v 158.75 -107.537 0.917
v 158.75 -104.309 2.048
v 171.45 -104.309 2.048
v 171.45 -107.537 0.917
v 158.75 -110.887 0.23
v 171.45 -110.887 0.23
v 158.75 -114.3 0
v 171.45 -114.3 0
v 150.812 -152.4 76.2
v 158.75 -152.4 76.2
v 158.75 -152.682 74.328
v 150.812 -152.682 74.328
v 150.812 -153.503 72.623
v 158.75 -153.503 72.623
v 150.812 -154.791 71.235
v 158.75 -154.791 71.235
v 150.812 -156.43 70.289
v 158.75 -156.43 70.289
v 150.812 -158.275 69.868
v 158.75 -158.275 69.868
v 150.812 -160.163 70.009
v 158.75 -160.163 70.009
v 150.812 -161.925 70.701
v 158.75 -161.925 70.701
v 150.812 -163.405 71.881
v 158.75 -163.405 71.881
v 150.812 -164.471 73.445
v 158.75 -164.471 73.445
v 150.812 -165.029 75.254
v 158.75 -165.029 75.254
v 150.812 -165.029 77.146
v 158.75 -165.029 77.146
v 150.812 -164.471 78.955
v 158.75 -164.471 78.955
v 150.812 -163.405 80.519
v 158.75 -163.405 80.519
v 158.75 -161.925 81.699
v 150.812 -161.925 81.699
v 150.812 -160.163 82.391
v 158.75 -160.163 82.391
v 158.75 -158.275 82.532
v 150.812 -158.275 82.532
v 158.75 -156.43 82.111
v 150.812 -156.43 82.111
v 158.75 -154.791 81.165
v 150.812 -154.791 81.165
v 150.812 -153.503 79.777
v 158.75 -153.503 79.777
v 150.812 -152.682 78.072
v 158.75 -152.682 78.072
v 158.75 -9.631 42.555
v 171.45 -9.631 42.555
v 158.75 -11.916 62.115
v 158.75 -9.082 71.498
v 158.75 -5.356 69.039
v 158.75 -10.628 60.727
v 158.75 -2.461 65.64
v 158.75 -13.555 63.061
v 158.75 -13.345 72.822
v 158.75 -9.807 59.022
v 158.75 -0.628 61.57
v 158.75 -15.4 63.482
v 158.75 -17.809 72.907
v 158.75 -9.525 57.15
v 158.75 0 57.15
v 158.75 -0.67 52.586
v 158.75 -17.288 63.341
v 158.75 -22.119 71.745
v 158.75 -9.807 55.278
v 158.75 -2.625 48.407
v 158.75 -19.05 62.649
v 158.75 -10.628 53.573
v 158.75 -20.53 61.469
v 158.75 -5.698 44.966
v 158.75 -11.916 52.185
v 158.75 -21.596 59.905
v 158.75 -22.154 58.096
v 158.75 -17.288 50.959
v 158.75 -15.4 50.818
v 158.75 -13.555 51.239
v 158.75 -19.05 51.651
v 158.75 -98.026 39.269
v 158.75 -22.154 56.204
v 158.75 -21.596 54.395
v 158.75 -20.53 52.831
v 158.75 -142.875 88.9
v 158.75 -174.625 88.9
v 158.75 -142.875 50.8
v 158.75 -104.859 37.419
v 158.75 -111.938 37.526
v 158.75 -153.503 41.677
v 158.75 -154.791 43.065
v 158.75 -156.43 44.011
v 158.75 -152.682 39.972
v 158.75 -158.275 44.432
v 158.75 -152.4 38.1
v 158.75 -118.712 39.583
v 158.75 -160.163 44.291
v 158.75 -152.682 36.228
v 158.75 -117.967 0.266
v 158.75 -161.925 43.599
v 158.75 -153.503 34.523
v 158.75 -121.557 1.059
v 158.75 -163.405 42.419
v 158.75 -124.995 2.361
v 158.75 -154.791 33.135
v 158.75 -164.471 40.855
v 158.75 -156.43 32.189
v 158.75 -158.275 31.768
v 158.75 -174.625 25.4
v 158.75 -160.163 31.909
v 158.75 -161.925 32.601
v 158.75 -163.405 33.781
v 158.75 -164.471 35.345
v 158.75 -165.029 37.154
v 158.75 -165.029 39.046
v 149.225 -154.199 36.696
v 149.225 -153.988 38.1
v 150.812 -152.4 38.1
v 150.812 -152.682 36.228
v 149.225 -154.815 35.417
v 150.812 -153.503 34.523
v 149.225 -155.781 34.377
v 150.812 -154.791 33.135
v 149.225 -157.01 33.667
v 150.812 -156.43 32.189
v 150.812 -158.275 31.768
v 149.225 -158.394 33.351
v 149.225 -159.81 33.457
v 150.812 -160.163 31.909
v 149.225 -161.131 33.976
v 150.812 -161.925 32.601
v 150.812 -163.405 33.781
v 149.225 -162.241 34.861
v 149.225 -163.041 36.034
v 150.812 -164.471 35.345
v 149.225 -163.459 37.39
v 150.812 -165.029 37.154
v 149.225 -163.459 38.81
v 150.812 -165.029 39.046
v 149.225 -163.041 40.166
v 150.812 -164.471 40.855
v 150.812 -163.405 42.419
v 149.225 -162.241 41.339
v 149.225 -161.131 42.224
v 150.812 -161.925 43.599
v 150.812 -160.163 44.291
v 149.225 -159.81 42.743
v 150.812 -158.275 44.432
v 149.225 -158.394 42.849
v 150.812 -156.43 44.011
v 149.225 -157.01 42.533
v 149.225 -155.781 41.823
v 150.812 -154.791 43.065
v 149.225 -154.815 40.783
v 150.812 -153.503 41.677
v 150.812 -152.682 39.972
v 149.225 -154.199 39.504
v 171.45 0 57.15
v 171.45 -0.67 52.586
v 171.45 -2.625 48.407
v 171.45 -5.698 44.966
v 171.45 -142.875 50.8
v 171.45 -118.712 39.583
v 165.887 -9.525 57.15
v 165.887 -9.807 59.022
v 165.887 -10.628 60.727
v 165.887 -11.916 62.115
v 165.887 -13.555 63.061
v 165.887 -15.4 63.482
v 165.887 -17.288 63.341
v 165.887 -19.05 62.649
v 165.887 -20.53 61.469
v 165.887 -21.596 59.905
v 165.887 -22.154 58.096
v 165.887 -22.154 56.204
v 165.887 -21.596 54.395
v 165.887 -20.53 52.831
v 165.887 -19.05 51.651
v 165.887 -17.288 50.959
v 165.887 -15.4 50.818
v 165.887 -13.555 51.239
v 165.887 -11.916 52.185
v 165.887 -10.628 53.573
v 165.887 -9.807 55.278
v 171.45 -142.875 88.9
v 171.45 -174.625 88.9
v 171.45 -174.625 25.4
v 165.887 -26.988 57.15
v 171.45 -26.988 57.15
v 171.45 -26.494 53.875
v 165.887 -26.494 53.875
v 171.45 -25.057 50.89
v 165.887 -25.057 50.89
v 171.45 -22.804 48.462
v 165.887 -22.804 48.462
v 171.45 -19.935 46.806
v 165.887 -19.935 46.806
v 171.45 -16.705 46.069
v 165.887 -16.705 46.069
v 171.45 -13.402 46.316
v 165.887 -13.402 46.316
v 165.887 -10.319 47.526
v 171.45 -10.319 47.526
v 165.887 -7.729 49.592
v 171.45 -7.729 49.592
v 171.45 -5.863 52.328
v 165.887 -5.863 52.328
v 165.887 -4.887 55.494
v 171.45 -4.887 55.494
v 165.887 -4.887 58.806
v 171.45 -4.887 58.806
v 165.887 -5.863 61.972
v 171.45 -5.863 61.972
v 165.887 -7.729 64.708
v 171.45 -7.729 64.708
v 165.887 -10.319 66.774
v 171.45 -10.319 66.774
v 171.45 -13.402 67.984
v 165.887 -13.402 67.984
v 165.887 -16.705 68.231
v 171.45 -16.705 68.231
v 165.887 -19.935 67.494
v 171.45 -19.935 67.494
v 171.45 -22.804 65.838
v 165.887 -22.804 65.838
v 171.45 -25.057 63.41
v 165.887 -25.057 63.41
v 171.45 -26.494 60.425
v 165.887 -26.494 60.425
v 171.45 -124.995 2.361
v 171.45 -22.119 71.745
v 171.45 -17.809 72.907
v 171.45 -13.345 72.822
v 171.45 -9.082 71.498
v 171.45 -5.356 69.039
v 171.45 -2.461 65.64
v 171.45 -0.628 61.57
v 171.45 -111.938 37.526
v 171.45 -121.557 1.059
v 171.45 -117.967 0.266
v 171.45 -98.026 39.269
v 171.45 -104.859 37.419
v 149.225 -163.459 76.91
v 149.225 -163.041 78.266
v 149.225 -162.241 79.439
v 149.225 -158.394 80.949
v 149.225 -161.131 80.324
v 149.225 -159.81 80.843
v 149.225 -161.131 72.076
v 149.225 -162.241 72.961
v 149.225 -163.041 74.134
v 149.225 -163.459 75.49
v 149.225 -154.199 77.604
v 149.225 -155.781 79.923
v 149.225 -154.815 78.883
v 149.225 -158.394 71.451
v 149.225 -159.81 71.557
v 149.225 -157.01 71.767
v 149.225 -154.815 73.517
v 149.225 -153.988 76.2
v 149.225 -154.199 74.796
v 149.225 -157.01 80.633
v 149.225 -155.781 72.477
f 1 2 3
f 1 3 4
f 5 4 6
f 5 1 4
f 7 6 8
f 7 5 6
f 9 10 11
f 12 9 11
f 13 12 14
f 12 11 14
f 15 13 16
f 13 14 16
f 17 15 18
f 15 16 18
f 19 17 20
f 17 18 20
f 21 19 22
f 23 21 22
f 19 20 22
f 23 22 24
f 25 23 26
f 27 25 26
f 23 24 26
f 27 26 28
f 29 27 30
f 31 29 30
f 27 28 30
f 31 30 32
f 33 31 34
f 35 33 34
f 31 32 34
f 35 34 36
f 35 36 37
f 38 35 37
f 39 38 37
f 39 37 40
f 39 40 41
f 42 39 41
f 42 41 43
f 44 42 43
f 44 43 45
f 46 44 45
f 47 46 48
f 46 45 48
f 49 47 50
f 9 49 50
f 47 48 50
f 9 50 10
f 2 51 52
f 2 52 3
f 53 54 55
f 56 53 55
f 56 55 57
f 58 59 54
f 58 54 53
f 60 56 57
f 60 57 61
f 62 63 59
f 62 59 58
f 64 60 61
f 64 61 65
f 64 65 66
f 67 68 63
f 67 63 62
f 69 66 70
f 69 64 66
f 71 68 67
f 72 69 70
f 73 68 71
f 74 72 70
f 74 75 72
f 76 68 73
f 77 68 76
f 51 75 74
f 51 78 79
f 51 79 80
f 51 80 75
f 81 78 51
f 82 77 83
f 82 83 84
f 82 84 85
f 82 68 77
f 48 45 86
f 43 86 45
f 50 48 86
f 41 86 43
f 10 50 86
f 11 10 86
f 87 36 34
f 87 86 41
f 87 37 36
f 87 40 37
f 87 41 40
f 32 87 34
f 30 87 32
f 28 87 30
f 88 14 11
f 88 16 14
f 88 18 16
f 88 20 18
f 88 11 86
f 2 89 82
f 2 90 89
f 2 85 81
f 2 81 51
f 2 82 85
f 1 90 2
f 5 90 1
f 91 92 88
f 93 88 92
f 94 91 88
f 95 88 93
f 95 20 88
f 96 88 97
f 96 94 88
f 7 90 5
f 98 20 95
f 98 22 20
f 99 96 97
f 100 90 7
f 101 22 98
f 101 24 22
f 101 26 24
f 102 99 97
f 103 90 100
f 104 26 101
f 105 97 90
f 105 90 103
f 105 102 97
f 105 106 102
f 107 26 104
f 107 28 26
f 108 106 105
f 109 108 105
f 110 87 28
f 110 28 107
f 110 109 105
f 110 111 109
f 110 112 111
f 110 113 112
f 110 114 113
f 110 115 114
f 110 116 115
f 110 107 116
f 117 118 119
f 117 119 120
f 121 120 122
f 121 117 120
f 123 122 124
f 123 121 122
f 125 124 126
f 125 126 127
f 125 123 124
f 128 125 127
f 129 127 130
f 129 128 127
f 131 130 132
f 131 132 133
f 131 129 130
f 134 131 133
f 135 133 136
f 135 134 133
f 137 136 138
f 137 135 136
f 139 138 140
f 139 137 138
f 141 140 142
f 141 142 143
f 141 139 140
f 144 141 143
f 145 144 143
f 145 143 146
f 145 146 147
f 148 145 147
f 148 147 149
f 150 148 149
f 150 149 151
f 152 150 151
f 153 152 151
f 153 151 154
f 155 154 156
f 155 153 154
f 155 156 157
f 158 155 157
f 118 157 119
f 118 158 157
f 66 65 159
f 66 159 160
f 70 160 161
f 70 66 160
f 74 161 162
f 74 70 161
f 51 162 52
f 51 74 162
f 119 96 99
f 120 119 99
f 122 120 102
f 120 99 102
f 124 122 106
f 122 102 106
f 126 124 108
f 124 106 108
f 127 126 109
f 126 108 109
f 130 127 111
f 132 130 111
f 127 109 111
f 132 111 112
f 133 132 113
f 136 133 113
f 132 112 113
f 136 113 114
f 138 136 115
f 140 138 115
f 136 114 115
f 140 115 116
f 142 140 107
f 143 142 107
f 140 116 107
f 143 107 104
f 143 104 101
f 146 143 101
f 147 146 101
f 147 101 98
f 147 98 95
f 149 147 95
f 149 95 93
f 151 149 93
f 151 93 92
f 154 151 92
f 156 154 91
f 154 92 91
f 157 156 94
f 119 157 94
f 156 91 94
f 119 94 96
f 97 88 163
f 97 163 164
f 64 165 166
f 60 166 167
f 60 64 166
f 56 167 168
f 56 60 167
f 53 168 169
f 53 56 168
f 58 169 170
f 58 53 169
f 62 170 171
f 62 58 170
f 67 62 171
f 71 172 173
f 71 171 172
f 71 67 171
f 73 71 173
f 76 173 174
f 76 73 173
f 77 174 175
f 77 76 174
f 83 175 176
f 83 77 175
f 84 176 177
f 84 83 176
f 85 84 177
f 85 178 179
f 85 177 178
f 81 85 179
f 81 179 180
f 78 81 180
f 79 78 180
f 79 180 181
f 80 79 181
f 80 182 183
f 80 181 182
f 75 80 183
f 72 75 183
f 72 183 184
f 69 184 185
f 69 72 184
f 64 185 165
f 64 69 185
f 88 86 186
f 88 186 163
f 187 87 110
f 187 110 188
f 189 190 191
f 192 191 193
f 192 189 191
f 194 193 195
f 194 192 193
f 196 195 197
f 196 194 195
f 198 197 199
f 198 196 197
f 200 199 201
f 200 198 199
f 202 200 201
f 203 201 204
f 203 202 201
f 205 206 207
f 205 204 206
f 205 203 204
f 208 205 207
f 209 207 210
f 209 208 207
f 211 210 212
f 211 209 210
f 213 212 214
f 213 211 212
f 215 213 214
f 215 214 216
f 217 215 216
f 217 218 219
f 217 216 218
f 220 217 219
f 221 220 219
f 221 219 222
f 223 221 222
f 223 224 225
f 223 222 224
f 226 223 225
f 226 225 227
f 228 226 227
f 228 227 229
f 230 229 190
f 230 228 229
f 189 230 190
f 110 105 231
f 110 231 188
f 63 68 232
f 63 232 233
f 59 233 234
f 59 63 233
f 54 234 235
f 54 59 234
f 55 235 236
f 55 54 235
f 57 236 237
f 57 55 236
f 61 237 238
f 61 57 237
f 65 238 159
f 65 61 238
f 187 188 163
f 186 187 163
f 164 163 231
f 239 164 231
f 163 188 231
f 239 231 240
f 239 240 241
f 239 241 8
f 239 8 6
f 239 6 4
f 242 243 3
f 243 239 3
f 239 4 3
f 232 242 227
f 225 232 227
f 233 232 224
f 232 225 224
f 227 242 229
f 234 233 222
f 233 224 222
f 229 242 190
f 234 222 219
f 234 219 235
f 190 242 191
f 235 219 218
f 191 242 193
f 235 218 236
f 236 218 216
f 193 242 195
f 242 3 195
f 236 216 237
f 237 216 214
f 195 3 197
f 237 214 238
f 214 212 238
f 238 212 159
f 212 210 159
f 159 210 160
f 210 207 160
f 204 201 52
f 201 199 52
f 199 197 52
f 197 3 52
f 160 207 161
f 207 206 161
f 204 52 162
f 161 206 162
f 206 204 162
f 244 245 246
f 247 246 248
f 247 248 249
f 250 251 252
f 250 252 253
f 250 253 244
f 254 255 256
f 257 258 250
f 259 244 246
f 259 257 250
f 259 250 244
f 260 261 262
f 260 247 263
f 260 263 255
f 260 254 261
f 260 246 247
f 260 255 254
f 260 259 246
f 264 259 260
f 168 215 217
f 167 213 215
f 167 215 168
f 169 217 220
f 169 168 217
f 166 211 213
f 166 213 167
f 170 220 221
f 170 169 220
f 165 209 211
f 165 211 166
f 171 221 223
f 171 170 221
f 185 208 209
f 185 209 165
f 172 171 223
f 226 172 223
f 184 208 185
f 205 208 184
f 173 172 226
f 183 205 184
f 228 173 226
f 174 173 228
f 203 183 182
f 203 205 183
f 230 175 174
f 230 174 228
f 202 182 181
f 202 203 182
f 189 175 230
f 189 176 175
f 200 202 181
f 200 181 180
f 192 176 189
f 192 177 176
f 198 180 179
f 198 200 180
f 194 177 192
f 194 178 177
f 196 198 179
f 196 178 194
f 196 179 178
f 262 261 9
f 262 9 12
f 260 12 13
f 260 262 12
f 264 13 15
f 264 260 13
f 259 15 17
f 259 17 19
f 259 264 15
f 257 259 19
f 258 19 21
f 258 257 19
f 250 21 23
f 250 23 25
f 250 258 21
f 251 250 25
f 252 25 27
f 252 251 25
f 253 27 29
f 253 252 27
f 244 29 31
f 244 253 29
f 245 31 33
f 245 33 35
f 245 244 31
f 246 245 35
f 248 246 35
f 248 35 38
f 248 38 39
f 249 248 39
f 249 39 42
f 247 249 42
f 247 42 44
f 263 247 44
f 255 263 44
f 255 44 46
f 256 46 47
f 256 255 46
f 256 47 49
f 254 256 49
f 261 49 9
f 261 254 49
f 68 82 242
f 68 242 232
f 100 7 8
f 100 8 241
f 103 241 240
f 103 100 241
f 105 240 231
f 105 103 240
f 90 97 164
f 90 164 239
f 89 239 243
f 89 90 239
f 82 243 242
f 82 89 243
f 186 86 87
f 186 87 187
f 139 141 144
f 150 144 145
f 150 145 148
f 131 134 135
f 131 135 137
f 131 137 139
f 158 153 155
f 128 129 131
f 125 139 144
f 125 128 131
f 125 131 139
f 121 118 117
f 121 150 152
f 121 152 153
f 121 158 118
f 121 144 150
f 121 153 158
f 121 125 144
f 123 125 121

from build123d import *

# Parameters (mm, degrees)
BOSS_EXTRUDE1_DEPTH      = 88.9
CUT_EXTRUDE2_DEPTH       = 241.232341963
CUT_EXTRUDE2_DEPTH_BACK  = 241.232341963
SKETCH3_R                = 28.575
CUT_EXTRUDE5_DEPTH       = 28.575
CUT_EXTRUDE6_DEPTH       = 243.134084755
CUT_EXTRUDE6_DEPTH_BACK  = 243.134084755
SKETCH4_R                = 12.7
CUT_EXTRUDE7_DEPTH       = 261.369359036
CUT_EXTRUDE7_DEPTH_BACK  = 261.369359036
CUT_EXTRUDE8_DEPTH       = 261.369359036
CUT_EXTRUDE8_DEPTH_BACK  = 12.7
SKETCH6_R                = 6.35
SKETCH7_R                = 6.35
CUT_EXTRUDE9_DEPTH       = 12.7
SKETCH12_R               = 12.7
CUT_EXTRUDE13_DEPTH      = 3.175
CUT_EXTRUDE14_DEPTH      = 158.75
CUT_EXTRUDE14_DEPTH_BACK = 253.187753717
CUT_EXTRUDE14_START      = -12.7
SKETCH14_R               = 1.5875
CUT_EXTRUDE15_DEPTH      = 261.369359036
CUT_EXTRUDE15_DEPTH_BACK = 261.369359036
SKETCH15_W               = 158.75
SKETCH15_H               = 174.625
SKETCH17_R               = 6.35
BOSS_EXTRUDE3_DEPTH      = 9.525
CHAMFER2_SIZE            = 1.5875
CUT_EXTRUDE16_DEPTH      = 198.208141947
CUT_EXTRUDE16_DEPTH_BACK = 5.5626
SKETCH18_R               = 11.1125


with BuildPart() as part:
    # Sketch1 → Boss-Extrude1 (new body)
    with BuildSketch(Plane.XY):
        Polygon((0, 0), (0, -174.625), (171.45, -174.625), (171.45, 0), (158.75, 0), (158.75, -142.875), (12.7, -142.875), (12.7, 0), align=None)
    extrude(amount=BOSS_EXTRUDE1_DEPTH)

    # Sketch2 → Cut-Extrude2 (cut, two sides: drawn at the far end of the back side and taken through both)
    with BuildSketch(Plane(origin=(0, -142.875, 0), x_dir=(1, 0, 0), z_dir=(0, 1, 0)).offset(-CUT_EXTRUDE2_DEPTH_BACK)):
        Polygon((158.75, 0), (12.7, 0), (12.7, -25.4), (85.724999876, -25.4), (158.75, -25.4), align=None)
    extrude(amount=CUT_EXTRUDE2_DEPTH + CUT_EXTRUDE2_DEPTH_BACK, mode=Mode.SUBTRACT)

    # Sketch3 → Cut-Extrude5 (cut)
    with BuildSketch(Plane.XZ.offset(174.625)):
        with Locations((85.725, 57.15)):
            Circle(SKETCH3_R)
    extrude(amount=-CUT_EXTRUDE5_DEPTH, mode=Mode.SUBTRACT)

    # Sketch4 → Cut-Extrude6 (cut, two sides: drawn at the far end of the back side and taken through both)
    with BuildSketch(Plane.XZ.offset(146.05).offset(-CUT_EXTRUDE6_DEPTH_BACK)):
        with Locations((85.725, 57.15)):
            Circle(SKETCH4_R)
    extrude(amount=CUT_EXTRUDE6_DEPTH + CUT_EXTRUDE6_DEPTH_BACK, mode=Mode.SUBTRACT)

    # Sketch5 → Cut-Extrude7 (cut, two sides: drawn at the far end of the back side and taken through both)
    with BuildSketch(Plane(origin=(171.45, 0, 0), x_dir=(0, 0, -1), z_dir=(1, 0, 0)).offset(-CUT_EXTRUDE7_DEPTH_BACK)):
        with BuildLine():
            Line((0, -174.625), (0, -114.3))
            ThreePointArc((0, -114.3), (-0.597344099, -119.776153781), (-2.361280333, -124.994736842))
            Line((-2.361280333, -124.994736842), (-25.4, -174.625))
            Line((-25.4, -174.625), (0, -174.625))
        make_face()
        with BuildLine():
            Line((-39.269490456, -98.025866748), (-71.745289975, -22.119448379))
            ThreePointArc((-71.745289975, -22.119448379), (-70.400400796, -7.131859618), (-57.149999966, 0))
            Line((-57.149999966, 0), (-88.9, 0))
            Line((-88.9, 0), (-88.9, -142.875))
            Line((-88.9, -142.875), (-50.8, -142.875))
            Line((-50.8, -142.875), (-39.583234749, -118.711720996))
            ThreePointArc((-39.583234749, -118.711720996), (-37.224875429, -108.402184034), (-39.269490456, -98.025866748))
        make_face()
        with BuildLine():
            Line((0, 0), (-57.149999966, 0))
            ThreePointArc((-57.149999966, 0), (-48.406859618, -2.624599204), (-42.554710025, -9.630551621))
            Line((-42.554710025, -9.630551621), (-2.047536041, -104.308882594))
            ThreePointArc((-2.047536041, -104.308882594), (-0.51714863, -109.200616928), (0, -114.3))
            Line((0, -114.3), (0, 0))
        make_face()
    extrude(amount=CUT_EXTRUDE7_DEPTH + CUT_EXTRUDE7_DEPTH_BACK, mode=Mode.SUBTRACT)

    # Sketch6 → Cut-Extrude8 (cut, two sides: drawn at the far end of the back side and taken through both)
    with BuildSketch(Plane(origin=(171.45, 0, 0), x_dir=(0, 0, -1), z_dir=(1, 0, 0)).offset(-CUT_EXTRUDE8_DEPTH_BACK)):
        with Locations(Location((-57.15, -15.875, 0), (0, 0, 90))):
            Circle(SKETCH6_R)
    extrude(amount=CUT_EXTRUDE8_DEPTH + CUT_EXTRUDE8_DEPTH_BACK, mode=Mode.SUBTRACT)

    # Sketch7 → Cut-Extrude9 (cut)
    with BuildSketch(Plane(origin=(12.7, 0, 0), x_dir=(0, 0, -1), z_dir=(1, 0, 0))):
        with Locations(Location((-57.15, -15.875, 0), (0, 0, 90))):
            Circle(SKETCH7_R)
    extrude(amount=-CUT_EXTRUDE9_DEPTH, mode=Mode.SUBTRACT)

    # Sketch12 → Cut-Extrude13 (cut)
    with BuildSketch(Plane(origin=(12.7, 0, 0), x_dir=(0, 0, -1), z_dir=(1, 0, 0))):
        with Locations((-57.15, -15.875)):
            Circle(SKETCH12_R)
    extrude(amount=-CUT_EXTRUDE13_DEPTH, mode=Mode.SUBTRACT)

    # Sketch14 → Cut-Extrude14 (cut, two sides: drawn at the far end of the back side and taken through both)
    with BuildSketch(Plane(origin=(12.7, 0, 0), x_dir=(0, 0, -1), z_dir=(1, 0, 0)).offset(CUT_EXTRUDE14_START - CUT_EXTRUDE14_DEPTH_BACK)):
        with Locations(Location((-53.770765225, -24.780413934, 0), (0, 0, 90))):
            Circle(SKETCH14_R)
        with Locations(Location((-66.551932086, -14.348796194, 0), (0, 0, 90))):
            Circle(SKETCH14_R)
        with Locations(Location((-51.12730269, -8.495789872, 0), (0, 0, 90))):
            Circle(SKETCH14_R)
    extrude(amount=CUT_EXTRUDE14_DEPTH + CUT_EXTRUDE14_DEPTH_BACK, mode=Mode.SUBTRACT)

    # Sketch15 → Cut-Extrude15 (cut, two sides: drawn at the far end of the back side and taken through both)
    with BuildSketch(Plane.XY.offset(88.9).offset(-CUT_EXTRUDE15_DEPTH_BACK)):
        with Locations((79.375, -87.3125)):
            Rectangle(SKETCH15_W, SKETCH15_H)
    extrude(amount=CUT_EXTRUDE15_DEPTH + CUT_EXTRUDE15_DEPTH_BACK, mode=Mode.SUBTRACT)

    # Sketch17 → Boss-Extrude3 (add)
    with BuildSketch(Plane.ZY.offset(-158.75)):
        with Locations(Location((76.2, -158.75, 0), (0, 0, 90))):
            Circle(SKETCH17_R)
        with Locations(Location((38.1, -158.75, 0), (0, 0, 90))):
            Circle(SKETCH17_R)
    extrude(amount=BOSS_EXTRUDE3_DEPTH)

    # Chamfer2
    chamfer2_edges = [part.edges().sort_by_distance(p)[0] for p in [
        (149.225, -165.1, 76.2),
        (149.225, -165.1, 38.1),
    ]]
    chamfer(chamfer2_edges, length=CHAMFER2_SIZE)

    # Sketch18 → Cut-Extrude16 (cut, two sides: drawn at the far end of the back side and taken through both)
    with BuildSketch(Plane(origin=(171.45, 0, 0), x_dir=(0, 0, -1), z_dir=(1, 0, 0)).offset(-CUT_EXTRUDE16_DEPTH_BACK)):
        with Locations(Location((-57.15, -15.875, 0), (0, 0, 270))):
            Circle(SKETCH18_R)
    extrude(amount=CUT_EXTRUDE16_DEPTH + CUT_EXTRUDE16_DEPTH_BACK, mode=Mode.SUBTRACT)


solid = part.part
